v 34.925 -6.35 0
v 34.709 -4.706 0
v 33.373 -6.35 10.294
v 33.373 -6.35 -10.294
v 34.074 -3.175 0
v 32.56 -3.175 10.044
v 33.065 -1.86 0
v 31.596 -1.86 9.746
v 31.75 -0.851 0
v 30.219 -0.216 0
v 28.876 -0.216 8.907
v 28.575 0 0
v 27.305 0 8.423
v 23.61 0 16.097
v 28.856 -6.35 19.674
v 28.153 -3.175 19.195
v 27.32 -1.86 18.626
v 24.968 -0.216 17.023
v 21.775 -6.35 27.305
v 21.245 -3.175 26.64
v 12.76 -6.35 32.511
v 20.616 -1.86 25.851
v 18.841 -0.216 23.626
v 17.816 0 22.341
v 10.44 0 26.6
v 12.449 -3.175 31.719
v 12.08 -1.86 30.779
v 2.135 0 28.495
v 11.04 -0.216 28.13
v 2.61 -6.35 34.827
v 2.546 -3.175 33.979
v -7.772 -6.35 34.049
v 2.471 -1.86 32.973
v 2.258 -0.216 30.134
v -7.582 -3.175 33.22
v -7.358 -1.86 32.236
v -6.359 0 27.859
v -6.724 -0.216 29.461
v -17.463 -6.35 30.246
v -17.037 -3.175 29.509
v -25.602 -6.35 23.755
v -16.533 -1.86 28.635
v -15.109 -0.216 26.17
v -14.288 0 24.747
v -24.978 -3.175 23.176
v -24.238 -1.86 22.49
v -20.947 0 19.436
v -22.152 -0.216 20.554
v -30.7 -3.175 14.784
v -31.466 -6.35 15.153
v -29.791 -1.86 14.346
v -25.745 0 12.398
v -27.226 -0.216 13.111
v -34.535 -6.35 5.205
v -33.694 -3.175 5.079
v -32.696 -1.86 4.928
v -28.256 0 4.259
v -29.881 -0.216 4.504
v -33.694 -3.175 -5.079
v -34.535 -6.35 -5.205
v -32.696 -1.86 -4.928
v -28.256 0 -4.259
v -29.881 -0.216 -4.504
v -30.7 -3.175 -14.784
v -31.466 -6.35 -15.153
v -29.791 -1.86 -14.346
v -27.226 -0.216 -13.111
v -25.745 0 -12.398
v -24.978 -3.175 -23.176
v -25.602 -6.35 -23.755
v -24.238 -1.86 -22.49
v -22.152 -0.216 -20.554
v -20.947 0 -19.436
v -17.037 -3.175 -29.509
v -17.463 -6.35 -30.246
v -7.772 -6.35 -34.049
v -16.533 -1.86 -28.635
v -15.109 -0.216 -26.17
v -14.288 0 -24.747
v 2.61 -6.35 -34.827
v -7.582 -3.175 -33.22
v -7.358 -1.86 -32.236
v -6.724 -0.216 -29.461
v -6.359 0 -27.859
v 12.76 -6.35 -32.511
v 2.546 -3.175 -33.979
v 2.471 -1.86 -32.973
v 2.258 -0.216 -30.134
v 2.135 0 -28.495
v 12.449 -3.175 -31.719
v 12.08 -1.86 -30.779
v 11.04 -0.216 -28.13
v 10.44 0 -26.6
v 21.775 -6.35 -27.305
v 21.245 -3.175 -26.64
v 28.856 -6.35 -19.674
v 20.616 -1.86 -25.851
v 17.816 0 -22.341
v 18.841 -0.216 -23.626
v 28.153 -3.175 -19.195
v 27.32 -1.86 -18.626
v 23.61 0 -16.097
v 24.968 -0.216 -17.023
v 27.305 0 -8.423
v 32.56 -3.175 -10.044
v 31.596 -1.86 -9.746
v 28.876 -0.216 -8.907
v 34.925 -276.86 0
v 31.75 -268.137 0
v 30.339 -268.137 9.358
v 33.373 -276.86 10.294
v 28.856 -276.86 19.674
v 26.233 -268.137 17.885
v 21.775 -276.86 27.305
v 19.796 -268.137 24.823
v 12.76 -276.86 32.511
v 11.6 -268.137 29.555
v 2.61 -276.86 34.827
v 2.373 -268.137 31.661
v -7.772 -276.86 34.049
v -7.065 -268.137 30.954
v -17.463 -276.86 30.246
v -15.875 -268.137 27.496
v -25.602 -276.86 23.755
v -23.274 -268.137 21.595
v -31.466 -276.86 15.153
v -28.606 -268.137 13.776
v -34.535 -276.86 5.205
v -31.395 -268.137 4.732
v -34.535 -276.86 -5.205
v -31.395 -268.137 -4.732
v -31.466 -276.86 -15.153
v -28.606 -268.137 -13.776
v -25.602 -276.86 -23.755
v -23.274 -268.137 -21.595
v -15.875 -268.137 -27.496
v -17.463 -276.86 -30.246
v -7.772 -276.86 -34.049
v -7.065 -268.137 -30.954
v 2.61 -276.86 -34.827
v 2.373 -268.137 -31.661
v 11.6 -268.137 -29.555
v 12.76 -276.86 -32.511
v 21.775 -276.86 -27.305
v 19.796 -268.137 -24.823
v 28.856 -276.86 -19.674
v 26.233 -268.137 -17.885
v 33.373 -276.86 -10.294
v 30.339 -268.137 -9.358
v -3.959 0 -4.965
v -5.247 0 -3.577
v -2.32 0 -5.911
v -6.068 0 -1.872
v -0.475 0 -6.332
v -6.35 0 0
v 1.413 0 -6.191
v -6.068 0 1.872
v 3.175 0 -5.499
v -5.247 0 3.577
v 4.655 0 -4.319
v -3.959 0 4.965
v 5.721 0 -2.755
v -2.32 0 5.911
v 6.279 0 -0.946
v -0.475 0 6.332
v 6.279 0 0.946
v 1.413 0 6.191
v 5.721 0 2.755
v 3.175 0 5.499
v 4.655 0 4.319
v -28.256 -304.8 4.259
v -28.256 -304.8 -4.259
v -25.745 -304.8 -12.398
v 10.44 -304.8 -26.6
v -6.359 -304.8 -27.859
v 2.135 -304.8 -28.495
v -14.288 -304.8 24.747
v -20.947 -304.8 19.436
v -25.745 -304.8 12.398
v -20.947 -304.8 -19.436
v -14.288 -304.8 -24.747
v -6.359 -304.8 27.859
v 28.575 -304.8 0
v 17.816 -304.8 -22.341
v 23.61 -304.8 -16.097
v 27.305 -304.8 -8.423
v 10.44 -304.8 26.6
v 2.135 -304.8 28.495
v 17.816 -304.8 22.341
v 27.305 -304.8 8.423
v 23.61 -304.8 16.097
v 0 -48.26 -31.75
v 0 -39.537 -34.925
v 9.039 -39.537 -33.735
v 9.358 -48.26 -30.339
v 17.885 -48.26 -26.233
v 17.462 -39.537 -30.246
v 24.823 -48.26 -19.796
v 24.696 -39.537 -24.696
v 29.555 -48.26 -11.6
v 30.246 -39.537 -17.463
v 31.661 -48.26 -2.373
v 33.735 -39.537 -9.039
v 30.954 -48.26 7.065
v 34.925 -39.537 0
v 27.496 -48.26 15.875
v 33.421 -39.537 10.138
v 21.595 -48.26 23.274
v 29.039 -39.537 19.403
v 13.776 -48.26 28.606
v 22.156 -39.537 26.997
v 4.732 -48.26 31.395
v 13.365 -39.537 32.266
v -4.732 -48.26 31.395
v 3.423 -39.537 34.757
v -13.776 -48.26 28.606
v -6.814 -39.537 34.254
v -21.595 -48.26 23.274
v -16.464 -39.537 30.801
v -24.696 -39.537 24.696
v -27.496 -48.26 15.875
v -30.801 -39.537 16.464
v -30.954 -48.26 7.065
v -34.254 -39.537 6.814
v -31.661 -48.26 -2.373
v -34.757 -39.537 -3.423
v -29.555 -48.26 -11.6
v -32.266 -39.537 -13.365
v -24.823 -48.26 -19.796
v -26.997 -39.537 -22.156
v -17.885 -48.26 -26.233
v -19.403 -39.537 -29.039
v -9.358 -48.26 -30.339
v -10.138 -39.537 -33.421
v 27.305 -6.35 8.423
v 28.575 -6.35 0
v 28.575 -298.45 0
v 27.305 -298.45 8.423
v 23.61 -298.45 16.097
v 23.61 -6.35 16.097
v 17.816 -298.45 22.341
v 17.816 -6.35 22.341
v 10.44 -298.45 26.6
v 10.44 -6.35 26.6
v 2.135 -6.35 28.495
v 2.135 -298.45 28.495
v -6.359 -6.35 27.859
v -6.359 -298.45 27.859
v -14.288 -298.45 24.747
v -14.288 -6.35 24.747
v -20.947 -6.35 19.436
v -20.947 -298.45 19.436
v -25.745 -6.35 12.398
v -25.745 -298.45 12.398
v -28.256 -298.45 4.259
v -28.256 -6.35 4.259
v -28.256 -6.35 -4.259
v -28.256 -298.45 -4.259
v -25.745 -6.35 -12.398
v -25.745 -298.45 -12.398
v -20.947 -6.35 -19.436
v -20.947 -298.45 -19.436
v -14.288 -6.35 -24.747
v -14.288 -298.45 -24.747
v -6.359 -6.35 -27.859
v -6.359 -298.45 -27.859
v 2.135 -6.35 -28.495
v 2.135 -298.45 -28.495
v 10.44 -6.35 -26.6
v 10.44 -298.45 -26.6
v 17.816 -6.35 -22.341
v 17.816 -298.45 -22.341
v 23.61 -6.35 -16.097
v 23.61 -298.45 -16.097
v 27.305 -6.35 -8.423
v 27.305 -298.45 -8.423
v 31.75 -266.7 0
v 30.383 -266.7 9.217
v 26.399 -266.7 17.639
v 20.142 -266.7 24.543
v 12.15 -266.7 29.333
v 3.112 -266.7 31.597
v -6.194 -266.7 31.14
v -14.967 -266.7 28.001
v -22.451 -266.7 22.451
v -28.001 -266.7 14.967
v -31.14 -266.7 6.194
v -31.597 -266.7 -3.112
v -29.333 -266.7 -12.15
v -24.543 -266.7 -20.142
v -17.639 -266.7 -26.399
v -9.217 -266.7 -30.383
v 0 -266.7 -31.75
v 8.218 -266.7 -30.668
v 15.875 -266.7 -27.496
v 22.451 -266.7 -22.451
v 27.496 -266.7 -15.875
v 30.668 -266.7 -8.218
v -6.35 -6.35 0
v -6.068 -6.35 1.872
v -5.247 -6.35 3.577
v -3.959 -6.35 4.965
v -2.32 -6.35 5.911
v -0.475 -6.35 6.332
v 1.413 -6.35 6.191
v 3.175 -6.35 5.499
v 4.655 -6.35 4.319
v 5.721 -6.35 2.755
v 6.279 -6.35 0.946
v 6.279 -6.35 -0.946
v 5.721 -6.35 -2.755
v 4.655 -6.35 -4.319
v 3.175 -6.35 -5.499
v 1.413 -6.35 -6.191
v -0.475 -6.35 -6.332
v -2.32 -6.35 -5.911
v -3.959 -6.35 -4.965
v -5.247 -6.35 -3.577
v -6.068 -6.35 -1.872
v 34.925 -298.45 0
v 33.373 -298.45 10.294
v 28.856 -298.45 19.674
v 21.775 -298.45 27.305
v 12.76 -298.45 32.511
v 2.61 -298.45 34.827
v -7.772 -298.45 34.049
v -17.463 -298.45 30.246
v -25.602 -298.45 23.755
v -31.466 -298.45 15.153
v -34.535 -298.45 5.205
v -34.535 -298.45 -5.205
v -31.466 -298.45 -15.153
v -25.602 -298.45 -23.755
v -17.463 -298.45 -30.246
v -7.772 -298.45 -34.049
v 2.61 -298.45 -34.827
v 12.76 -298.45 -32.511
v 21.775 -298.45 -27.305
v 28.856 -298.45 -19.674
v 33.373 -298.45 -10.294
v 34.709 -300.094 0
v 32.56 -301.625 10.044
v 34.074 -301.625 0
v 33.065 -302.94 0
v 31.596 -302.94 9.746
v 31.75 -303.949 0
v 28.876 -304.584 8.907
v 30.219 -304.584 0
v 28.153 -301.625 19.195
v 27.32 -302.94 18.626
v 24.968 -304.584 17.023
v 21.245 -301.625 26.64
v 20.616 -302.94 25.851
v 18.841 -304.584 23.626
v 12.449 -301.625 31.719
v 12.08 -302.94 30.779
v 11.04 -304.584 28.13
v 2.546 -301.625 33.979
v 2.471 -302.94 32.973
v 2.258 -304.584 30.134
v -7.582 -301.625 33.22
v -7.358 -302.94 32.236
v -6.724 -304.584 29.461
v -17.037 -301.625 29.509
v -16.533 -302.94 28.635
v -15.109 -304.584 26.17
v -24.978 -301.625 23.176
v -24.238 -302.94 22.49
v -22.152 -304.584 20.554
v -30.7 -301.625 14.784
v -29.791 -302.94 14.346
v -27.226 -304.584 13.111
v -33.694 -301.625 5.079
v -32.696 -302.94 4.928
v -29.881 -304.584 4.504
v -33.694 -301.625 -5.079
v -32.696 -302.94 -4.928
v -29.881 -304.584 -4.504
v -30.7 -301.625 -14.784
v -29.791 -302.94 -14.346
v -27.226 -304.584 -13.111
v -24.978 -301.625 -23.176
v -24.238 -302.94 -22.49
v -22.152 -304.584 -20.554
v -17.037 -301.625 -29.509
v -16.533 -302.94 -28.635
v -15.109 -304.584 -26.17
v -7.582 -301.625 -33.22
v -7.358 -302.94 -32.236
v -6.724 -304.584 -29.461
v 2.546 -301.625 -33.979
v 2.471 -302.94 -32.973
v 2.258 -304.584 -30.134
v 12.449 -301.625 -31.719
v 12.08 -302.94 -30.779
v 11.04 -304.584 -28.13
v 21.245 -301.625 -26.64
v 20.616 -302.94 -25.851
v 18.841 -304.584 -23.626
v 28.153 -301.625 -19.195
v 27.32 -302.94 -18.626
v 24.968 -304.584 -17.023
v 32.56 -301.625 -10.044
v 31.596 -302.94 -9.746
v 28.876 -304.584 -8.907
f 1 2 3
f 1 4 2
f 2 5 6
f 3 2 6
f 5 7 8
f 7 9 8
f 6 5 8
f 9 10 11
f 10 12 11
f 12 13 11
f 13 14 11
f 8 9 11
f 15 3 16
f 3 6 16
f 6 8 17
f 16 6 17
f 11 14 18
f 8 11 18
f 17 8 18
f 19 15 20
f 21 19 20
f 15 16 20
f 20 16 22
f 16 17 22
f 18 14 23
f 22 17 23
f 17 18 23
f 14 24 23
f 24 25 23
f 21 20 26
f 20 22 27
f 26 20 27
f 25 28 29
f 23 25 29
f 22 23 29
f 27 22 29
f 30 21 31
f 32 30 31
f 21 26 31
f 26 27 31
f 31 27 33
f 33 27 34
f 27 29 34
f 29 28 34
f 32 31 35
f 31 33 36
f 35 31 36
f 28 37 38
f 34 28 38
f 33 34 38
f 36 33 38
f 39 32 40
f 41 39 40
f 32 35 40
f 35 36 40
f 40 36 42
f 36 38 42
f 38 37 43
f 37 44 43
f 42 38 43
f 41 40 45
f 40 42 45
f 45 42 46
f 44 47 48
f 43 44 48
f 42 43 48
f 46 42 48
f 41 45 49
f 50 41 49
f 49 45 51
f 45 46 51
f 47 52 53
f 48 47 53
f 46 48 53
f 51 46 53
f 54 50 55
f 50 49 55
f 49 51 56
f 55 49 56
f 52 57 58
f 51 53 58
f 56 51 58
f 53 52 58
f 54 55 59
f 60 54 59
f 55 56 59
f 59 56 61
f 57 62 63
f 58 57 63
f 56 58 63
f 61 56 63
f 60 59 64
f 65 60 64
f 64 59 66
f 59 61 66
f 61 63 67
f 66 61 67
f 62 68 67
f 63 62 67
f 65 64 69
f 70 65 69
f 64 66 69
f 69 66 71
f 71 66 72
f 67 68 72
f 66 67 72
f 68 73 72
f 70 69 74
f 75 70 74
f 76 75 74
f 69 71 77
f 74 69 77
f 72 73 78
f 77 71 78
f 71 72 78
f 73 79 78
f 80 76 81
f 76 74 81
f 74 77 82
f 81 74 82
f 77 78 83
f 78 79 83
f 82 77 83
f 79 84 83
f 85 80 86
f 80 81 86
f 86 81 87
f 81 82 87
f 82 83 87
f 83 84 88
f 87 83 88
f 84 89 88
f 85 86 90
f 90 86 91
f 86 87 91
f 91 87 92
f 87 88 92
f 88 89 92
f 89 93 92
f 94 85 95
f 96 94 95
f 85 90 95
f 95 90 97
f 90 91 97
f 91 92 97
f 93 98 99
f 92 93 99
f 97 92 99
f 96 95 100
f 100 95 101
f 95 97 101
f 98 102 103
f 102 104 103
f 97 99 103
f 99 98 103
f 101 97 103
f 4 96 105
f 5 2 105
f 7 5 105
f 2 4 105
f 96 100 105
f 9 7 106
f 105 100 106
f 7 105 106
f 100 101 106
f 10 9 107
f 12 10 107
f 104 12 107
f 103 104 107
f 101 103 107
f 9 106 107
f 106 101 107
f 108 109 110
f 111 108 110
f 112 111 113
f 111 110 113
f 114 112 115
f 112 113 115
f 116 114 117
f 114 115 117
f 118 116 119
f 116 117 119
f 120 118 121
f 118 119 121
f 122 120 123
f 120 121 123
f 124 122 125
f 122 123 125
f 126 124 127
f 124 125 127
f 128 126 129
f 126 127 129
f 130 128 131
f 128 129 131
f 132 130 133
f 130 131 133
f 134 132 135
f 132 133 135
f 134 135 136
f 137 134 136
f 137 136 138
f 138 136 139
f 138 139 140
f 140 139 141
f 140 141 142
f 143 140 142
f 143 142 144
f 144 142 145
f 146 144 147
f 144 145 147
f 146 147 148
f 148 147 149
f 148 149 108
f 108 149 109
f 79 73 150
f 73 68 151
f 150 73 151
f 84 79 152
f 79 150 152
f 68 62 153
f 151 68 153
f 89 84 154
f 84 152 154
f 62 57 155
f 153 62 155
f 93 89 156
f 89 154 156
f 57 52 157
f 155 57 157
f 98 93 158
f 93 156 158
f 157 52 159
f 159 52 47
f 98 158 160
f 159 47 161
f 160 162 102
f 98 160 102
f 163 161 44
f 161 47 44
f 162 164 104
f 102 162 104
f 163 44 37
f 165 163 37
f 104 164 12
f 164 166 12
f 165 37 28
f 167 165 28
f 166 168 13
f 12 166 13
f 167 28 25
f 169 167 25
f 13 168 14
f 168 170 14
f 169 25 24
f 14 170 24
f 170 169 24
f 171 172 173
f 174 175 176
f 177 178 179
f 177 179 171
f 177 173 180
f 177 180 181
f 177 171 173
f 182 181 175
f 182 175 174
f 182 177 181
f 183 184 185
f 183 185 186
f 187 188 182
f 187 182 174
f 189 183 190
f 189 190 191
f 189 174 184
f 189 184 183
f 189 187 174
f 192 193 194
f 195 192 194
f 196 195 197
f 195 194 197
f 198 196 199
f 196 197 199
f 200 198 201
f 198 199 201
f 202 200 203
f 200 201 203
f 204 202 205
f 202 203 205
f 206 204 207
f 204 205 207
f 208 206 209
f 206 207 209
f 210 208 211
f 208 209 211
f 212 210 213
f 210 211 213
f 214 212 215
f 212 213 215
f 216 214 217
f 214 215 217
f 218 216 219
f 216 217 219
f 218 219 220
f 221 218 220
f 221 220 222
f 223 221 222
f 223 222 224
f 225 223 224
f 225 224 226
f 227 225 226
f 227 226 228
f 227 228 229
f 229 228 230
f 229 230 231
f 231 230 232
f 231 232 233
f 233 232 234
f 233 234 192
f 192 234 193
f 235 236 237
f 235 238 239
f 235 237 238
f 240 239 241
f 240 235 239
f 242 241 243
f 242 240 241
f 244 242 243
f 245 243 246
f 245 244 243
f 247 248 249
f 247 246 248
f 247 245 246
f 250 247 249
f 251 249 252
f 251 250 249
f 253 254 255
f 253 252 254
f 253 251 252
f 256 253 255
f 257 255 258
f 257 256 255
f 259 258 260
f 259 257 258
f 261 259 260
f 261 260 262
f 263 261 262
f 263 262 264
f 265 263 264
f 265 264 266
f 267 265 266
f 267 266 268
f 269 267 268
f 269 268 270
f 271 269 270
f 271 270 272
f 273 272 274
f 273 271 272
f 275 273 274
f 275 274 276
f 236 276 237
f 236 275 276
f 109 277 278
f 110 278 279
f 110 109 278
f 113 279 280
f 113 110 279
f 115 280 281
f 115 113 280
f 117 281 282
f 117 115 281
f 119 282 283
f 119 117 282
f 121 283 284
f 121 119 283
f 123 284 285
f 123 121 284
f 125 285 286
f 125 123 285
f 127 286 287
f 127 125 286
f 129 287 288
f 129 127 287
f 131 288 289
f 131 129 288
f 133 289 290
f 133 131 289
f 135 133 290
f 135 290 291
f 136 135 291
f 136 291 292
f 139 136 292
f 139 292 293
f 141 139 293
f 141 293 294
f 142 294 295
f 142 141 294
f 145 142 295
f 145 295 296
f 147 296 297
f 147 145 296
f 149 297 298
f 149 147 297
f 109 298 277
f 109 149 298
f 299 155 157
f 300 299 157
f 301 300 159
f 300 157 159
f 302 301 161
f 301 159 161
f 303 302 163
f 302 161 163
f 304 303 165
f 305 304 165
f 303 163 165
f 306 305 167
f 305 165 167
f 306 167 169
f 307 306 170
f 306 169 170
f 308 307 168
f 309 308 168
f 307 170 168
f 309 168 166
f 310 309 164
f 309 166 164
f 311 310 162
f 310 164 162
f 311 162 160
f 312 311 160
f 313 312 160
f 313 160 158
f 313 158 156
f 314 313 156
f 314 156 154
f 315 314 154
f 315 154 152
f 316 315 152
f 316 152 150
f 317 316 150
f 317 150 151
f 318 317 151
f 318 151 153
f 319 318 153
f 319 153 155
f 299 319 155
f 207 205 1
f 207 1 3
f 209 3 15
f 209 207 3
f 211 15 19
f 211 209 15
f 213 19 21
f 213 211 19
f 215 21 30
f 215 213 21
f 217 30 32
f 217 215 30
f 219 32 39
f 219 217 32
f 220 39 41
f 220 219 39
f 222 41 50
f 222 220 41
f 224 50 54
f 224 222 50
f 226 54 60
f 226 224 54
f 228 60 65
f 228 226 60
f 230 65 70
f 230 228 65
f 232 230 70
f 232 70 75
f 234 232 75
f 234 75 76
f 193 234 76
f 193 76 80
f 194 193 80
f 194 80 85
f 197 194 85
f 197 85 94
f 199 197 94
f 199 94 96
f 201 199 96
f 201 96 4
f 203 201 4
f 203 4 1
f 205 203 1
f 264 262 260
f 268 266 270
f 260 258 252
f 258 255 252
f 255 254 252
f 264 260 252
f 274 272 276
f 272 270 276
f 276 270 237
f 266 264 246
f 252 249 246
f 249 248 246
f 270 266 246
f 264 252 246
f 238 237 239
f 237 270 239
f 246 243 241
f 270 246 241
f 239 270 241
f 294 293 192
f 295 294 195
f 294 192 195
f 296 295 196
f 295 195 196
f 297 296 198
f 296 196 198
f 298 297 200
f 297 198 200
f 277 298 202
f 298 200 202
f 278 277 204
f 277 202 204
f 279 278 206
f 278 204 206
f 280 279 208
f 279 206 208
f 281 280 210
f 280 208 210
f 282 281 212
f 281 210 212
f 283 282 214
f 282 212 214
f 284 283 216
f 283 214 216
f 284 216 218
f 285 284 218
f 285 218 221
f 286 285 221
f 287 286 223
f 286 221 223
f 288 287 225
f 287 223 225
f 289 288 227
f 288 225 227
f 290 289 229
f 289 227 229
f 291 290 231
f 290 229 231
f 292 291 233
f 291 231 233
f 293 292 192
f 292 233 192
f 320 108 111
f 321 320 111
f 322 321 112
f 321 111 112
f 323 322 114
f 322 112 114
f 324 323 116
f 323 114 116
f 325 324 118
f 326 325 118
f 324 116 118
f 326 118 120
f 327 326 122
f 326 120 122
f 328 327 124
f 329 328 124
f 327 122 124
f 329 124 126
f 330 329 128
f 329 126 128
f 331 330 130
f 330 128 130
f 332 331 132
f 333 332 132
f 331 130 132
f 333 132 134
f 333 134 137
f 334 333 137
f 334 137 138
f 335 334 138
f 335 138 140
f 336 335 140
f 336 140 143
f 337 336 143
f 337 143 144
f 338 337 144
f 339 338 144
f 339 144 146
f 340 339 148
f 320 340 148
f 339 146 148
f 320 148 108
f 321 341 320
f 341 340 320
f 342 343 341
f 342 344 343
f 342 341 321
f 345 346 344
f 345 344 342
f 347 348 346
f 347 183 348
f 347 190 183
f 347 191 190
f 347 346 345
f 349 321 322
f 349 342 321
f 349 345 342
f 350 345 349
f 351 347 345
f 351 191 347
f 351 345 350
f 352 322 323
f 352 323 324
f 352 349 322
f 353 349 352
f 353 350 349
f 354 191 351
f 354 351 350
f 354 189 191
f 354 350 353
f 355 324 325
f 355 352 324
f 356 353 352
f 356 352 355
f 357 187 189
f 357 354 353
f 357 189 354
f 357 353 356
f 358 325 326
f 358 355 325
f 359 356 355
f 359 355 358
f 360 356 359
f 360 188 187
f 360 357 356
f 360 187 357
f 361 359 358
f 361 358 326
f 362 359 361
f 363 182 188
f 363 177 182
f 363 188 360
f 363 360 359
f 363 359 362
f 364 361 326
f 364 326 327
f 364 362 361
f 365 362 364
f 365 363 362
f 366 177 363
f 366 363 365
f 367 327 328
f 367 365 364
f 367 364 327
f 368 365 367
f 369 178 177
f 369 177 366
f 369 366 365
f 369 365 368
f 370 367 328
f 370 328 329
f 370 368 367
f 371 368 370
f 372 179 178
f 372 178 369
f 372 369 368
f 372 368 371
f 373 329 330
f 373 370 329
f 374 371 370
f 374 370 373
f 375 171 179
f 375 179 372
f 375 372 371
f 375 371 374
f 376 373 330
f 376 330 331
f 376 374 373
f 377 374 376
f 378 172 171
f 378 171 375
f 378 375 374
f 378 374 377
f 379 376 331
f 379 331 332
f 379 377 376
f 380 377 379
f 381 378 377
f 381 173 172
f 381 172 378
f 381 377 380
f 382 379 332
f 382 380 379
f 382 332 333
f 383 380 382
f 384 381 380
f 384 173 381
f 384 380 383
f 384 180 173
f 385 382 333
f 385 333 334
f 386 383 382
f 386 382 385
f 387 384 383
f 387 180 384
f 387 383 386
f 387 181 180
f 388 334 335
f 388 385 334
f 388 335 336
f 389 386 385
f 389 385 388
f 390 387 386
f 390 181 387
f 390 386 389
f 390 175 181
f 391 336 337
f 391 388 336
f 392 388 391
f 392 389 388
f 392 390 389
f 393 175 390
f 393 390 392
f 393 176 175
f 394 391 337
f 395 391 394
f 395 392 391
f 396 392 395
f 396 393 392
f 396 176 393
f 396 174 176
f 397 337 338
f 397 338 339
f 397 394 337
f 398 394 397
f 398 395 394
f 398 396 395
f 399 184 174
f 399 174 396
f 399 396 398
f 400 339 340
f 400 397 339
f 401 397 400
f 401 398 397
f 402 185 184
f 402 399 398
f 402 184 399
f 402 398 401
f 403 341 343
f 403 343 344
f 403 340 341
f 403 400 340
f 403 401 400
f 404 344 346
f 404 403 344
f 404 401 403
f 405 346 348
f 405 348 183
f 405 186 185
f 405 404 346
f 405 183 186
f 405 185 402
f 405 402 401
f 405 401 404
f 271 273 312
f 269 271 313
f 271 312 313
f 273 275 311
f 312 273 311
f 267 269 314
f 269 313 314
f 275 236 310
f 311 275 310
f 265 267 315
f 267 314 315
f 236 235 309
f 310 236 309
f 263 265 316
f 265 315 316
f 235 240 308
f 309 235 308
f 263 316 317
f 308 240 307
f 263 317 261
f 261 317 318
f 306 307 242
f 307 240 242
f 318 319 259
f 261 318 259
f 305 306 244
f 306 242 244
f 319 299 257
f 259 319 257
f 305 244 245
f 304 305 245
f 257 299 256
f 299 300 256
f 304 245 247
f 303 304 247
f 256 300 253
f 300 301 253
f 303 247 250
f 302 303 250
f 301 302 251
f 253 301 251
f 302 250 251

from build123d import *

# Parameters (mm, degrees)
F0_R          = 34.925
F0_R_2        = 28.575
F1_DEPTH      = 304.8
F2_R          = 34.925
F3_DEPTH      = 6.35
F4_R          = 34.925
F5_DEPTH      = 6.35
F6_R          = 6.35
F7_R          = 6.35
F8_W          = 228.6
F8_H          = 3.175
F10_S5_R      = 34.925
F10_T6_DEPTH  = 52
F10_S11_R     = 31.75
F10_T12_DEPTH = 51
F11_R         = 6.35
F12_DEPTH     = 25.4


# Not quite as in the source:
# - a fillet or chamfer that OpenCascade refuses, or shapes differently, is made with other operations: its cross-section is extruded or revolved along the edge and cut away or added


with BuildPart() as f1:
    # F0 (on Front) → F1 (new body)
    with BuildSketch(Plane.XZ):
        Circle(F0_R)
        Circle(F0_R_2, mode=Mode.SUBTRACT)
    extrude(amount=F1_DEPTH)

    # F2 (on face) → F3 (join)
    with BuildSketch(Plane.XZ.offset(304.8)):
        Circle(F2_R)
    extrude(amount=-F3_DEPTH)

    # F4 (on face) → F5 (join)
    with BuildSketch(Plane(origin=(0, 0, 0), x_dir=(-1, 0, 0), z_dir=(0, 1, 0))):
        Circle(F4_R)
    extrude(amount=-F5_DEPTH)

    # F6
    f6_edges = [f1.edges().sort_by_distance(p)[0] for p in [
        (-34.925, 0, 0),
    ]]
    fillet(f6_edges, radius=F6_R)

    # F7
    f7_edges = [f1.edges().sort_by_distance(p)[0] for p in [
        (-34.925, -304.8, 0),
    ]]
    fillet(f7_edges, radius=F7_R)

    # F8 (on Right) → F9 (revolve, cut)
    with BuildSketch(Plane.YZ):
        with Locations((-152.4, -33.3375)):
            Rectangle(F8_W, F8_H)
    revolve(axis=Axis((0, -304.8, 0), (0, -1, 0)), mode=Mode.SUBTRACT)

    # F10: chamfer of 10.16 x 3.6979375801 on 2 edges, made by hand


with BuildPart() as f10_tool2:
    # F10_s3 → F10_t4 (revolve)
    with BuildSketch(Plane.YZ):
        Polygon((-48.26, -31.75), (-38.1, -35.4479375801), (-38.1, -31.75), align=None)
    revolve(axis=Axis((0, -38.1, 0), (0, -1, 0)))

    # F10_s5 → F10_t6 (intersect, symmetric)
    with BuildSketch(Plane.XZ.offset(43.2)):
        Circle(F10_S5_R)
    extrude(amount=F10_T6_DEPTH, both=True, mode=Mode.INTERSECT)


with BuildPart() as f1_1:
    add(f1.part)

    # F10_t1: union F10_tool2
    add(f10_tool2.part)


with BuildPart() as f10_tool8:
    # F10_s9 → F10_t10 (revolve)
    with BuildSketch(Plane.XY):
        Polygon((34.925, -276.86), (31.2270624199, -266.7), (34.925, -266.7), align=None)
    revolve(axis=Axis((0, -266.7, 0), (0, -1, 0)))

    # F10_s11 → F10_t12 (cut, symmetric)
    with BuildSketch(Plane.XZ.offset(271.8)):
        Circle(F10_S11_R)
    extrude(amount=F10_T12_DEPTH, both=True, mode=Mode.SUBTRACT)


with BuildPart() as f1_2:
    add(f1_1.part)

    # F10_t7: cut F10_tool8
    add(f10_tool8.part, mode=Mode.SUBTRACT)

    # F11 (on face) → F12 (cut)
    with BuildSketch(Plane(origin=(0, 0, 0), x_dir=(-1, 0, 0), z_dir=(0, 1, 0))):
        Circle(F11_R)
    extrude(amount=-F12_DEPTH, mode=Mode.SUBTRACT)


solid = f1_2.part
